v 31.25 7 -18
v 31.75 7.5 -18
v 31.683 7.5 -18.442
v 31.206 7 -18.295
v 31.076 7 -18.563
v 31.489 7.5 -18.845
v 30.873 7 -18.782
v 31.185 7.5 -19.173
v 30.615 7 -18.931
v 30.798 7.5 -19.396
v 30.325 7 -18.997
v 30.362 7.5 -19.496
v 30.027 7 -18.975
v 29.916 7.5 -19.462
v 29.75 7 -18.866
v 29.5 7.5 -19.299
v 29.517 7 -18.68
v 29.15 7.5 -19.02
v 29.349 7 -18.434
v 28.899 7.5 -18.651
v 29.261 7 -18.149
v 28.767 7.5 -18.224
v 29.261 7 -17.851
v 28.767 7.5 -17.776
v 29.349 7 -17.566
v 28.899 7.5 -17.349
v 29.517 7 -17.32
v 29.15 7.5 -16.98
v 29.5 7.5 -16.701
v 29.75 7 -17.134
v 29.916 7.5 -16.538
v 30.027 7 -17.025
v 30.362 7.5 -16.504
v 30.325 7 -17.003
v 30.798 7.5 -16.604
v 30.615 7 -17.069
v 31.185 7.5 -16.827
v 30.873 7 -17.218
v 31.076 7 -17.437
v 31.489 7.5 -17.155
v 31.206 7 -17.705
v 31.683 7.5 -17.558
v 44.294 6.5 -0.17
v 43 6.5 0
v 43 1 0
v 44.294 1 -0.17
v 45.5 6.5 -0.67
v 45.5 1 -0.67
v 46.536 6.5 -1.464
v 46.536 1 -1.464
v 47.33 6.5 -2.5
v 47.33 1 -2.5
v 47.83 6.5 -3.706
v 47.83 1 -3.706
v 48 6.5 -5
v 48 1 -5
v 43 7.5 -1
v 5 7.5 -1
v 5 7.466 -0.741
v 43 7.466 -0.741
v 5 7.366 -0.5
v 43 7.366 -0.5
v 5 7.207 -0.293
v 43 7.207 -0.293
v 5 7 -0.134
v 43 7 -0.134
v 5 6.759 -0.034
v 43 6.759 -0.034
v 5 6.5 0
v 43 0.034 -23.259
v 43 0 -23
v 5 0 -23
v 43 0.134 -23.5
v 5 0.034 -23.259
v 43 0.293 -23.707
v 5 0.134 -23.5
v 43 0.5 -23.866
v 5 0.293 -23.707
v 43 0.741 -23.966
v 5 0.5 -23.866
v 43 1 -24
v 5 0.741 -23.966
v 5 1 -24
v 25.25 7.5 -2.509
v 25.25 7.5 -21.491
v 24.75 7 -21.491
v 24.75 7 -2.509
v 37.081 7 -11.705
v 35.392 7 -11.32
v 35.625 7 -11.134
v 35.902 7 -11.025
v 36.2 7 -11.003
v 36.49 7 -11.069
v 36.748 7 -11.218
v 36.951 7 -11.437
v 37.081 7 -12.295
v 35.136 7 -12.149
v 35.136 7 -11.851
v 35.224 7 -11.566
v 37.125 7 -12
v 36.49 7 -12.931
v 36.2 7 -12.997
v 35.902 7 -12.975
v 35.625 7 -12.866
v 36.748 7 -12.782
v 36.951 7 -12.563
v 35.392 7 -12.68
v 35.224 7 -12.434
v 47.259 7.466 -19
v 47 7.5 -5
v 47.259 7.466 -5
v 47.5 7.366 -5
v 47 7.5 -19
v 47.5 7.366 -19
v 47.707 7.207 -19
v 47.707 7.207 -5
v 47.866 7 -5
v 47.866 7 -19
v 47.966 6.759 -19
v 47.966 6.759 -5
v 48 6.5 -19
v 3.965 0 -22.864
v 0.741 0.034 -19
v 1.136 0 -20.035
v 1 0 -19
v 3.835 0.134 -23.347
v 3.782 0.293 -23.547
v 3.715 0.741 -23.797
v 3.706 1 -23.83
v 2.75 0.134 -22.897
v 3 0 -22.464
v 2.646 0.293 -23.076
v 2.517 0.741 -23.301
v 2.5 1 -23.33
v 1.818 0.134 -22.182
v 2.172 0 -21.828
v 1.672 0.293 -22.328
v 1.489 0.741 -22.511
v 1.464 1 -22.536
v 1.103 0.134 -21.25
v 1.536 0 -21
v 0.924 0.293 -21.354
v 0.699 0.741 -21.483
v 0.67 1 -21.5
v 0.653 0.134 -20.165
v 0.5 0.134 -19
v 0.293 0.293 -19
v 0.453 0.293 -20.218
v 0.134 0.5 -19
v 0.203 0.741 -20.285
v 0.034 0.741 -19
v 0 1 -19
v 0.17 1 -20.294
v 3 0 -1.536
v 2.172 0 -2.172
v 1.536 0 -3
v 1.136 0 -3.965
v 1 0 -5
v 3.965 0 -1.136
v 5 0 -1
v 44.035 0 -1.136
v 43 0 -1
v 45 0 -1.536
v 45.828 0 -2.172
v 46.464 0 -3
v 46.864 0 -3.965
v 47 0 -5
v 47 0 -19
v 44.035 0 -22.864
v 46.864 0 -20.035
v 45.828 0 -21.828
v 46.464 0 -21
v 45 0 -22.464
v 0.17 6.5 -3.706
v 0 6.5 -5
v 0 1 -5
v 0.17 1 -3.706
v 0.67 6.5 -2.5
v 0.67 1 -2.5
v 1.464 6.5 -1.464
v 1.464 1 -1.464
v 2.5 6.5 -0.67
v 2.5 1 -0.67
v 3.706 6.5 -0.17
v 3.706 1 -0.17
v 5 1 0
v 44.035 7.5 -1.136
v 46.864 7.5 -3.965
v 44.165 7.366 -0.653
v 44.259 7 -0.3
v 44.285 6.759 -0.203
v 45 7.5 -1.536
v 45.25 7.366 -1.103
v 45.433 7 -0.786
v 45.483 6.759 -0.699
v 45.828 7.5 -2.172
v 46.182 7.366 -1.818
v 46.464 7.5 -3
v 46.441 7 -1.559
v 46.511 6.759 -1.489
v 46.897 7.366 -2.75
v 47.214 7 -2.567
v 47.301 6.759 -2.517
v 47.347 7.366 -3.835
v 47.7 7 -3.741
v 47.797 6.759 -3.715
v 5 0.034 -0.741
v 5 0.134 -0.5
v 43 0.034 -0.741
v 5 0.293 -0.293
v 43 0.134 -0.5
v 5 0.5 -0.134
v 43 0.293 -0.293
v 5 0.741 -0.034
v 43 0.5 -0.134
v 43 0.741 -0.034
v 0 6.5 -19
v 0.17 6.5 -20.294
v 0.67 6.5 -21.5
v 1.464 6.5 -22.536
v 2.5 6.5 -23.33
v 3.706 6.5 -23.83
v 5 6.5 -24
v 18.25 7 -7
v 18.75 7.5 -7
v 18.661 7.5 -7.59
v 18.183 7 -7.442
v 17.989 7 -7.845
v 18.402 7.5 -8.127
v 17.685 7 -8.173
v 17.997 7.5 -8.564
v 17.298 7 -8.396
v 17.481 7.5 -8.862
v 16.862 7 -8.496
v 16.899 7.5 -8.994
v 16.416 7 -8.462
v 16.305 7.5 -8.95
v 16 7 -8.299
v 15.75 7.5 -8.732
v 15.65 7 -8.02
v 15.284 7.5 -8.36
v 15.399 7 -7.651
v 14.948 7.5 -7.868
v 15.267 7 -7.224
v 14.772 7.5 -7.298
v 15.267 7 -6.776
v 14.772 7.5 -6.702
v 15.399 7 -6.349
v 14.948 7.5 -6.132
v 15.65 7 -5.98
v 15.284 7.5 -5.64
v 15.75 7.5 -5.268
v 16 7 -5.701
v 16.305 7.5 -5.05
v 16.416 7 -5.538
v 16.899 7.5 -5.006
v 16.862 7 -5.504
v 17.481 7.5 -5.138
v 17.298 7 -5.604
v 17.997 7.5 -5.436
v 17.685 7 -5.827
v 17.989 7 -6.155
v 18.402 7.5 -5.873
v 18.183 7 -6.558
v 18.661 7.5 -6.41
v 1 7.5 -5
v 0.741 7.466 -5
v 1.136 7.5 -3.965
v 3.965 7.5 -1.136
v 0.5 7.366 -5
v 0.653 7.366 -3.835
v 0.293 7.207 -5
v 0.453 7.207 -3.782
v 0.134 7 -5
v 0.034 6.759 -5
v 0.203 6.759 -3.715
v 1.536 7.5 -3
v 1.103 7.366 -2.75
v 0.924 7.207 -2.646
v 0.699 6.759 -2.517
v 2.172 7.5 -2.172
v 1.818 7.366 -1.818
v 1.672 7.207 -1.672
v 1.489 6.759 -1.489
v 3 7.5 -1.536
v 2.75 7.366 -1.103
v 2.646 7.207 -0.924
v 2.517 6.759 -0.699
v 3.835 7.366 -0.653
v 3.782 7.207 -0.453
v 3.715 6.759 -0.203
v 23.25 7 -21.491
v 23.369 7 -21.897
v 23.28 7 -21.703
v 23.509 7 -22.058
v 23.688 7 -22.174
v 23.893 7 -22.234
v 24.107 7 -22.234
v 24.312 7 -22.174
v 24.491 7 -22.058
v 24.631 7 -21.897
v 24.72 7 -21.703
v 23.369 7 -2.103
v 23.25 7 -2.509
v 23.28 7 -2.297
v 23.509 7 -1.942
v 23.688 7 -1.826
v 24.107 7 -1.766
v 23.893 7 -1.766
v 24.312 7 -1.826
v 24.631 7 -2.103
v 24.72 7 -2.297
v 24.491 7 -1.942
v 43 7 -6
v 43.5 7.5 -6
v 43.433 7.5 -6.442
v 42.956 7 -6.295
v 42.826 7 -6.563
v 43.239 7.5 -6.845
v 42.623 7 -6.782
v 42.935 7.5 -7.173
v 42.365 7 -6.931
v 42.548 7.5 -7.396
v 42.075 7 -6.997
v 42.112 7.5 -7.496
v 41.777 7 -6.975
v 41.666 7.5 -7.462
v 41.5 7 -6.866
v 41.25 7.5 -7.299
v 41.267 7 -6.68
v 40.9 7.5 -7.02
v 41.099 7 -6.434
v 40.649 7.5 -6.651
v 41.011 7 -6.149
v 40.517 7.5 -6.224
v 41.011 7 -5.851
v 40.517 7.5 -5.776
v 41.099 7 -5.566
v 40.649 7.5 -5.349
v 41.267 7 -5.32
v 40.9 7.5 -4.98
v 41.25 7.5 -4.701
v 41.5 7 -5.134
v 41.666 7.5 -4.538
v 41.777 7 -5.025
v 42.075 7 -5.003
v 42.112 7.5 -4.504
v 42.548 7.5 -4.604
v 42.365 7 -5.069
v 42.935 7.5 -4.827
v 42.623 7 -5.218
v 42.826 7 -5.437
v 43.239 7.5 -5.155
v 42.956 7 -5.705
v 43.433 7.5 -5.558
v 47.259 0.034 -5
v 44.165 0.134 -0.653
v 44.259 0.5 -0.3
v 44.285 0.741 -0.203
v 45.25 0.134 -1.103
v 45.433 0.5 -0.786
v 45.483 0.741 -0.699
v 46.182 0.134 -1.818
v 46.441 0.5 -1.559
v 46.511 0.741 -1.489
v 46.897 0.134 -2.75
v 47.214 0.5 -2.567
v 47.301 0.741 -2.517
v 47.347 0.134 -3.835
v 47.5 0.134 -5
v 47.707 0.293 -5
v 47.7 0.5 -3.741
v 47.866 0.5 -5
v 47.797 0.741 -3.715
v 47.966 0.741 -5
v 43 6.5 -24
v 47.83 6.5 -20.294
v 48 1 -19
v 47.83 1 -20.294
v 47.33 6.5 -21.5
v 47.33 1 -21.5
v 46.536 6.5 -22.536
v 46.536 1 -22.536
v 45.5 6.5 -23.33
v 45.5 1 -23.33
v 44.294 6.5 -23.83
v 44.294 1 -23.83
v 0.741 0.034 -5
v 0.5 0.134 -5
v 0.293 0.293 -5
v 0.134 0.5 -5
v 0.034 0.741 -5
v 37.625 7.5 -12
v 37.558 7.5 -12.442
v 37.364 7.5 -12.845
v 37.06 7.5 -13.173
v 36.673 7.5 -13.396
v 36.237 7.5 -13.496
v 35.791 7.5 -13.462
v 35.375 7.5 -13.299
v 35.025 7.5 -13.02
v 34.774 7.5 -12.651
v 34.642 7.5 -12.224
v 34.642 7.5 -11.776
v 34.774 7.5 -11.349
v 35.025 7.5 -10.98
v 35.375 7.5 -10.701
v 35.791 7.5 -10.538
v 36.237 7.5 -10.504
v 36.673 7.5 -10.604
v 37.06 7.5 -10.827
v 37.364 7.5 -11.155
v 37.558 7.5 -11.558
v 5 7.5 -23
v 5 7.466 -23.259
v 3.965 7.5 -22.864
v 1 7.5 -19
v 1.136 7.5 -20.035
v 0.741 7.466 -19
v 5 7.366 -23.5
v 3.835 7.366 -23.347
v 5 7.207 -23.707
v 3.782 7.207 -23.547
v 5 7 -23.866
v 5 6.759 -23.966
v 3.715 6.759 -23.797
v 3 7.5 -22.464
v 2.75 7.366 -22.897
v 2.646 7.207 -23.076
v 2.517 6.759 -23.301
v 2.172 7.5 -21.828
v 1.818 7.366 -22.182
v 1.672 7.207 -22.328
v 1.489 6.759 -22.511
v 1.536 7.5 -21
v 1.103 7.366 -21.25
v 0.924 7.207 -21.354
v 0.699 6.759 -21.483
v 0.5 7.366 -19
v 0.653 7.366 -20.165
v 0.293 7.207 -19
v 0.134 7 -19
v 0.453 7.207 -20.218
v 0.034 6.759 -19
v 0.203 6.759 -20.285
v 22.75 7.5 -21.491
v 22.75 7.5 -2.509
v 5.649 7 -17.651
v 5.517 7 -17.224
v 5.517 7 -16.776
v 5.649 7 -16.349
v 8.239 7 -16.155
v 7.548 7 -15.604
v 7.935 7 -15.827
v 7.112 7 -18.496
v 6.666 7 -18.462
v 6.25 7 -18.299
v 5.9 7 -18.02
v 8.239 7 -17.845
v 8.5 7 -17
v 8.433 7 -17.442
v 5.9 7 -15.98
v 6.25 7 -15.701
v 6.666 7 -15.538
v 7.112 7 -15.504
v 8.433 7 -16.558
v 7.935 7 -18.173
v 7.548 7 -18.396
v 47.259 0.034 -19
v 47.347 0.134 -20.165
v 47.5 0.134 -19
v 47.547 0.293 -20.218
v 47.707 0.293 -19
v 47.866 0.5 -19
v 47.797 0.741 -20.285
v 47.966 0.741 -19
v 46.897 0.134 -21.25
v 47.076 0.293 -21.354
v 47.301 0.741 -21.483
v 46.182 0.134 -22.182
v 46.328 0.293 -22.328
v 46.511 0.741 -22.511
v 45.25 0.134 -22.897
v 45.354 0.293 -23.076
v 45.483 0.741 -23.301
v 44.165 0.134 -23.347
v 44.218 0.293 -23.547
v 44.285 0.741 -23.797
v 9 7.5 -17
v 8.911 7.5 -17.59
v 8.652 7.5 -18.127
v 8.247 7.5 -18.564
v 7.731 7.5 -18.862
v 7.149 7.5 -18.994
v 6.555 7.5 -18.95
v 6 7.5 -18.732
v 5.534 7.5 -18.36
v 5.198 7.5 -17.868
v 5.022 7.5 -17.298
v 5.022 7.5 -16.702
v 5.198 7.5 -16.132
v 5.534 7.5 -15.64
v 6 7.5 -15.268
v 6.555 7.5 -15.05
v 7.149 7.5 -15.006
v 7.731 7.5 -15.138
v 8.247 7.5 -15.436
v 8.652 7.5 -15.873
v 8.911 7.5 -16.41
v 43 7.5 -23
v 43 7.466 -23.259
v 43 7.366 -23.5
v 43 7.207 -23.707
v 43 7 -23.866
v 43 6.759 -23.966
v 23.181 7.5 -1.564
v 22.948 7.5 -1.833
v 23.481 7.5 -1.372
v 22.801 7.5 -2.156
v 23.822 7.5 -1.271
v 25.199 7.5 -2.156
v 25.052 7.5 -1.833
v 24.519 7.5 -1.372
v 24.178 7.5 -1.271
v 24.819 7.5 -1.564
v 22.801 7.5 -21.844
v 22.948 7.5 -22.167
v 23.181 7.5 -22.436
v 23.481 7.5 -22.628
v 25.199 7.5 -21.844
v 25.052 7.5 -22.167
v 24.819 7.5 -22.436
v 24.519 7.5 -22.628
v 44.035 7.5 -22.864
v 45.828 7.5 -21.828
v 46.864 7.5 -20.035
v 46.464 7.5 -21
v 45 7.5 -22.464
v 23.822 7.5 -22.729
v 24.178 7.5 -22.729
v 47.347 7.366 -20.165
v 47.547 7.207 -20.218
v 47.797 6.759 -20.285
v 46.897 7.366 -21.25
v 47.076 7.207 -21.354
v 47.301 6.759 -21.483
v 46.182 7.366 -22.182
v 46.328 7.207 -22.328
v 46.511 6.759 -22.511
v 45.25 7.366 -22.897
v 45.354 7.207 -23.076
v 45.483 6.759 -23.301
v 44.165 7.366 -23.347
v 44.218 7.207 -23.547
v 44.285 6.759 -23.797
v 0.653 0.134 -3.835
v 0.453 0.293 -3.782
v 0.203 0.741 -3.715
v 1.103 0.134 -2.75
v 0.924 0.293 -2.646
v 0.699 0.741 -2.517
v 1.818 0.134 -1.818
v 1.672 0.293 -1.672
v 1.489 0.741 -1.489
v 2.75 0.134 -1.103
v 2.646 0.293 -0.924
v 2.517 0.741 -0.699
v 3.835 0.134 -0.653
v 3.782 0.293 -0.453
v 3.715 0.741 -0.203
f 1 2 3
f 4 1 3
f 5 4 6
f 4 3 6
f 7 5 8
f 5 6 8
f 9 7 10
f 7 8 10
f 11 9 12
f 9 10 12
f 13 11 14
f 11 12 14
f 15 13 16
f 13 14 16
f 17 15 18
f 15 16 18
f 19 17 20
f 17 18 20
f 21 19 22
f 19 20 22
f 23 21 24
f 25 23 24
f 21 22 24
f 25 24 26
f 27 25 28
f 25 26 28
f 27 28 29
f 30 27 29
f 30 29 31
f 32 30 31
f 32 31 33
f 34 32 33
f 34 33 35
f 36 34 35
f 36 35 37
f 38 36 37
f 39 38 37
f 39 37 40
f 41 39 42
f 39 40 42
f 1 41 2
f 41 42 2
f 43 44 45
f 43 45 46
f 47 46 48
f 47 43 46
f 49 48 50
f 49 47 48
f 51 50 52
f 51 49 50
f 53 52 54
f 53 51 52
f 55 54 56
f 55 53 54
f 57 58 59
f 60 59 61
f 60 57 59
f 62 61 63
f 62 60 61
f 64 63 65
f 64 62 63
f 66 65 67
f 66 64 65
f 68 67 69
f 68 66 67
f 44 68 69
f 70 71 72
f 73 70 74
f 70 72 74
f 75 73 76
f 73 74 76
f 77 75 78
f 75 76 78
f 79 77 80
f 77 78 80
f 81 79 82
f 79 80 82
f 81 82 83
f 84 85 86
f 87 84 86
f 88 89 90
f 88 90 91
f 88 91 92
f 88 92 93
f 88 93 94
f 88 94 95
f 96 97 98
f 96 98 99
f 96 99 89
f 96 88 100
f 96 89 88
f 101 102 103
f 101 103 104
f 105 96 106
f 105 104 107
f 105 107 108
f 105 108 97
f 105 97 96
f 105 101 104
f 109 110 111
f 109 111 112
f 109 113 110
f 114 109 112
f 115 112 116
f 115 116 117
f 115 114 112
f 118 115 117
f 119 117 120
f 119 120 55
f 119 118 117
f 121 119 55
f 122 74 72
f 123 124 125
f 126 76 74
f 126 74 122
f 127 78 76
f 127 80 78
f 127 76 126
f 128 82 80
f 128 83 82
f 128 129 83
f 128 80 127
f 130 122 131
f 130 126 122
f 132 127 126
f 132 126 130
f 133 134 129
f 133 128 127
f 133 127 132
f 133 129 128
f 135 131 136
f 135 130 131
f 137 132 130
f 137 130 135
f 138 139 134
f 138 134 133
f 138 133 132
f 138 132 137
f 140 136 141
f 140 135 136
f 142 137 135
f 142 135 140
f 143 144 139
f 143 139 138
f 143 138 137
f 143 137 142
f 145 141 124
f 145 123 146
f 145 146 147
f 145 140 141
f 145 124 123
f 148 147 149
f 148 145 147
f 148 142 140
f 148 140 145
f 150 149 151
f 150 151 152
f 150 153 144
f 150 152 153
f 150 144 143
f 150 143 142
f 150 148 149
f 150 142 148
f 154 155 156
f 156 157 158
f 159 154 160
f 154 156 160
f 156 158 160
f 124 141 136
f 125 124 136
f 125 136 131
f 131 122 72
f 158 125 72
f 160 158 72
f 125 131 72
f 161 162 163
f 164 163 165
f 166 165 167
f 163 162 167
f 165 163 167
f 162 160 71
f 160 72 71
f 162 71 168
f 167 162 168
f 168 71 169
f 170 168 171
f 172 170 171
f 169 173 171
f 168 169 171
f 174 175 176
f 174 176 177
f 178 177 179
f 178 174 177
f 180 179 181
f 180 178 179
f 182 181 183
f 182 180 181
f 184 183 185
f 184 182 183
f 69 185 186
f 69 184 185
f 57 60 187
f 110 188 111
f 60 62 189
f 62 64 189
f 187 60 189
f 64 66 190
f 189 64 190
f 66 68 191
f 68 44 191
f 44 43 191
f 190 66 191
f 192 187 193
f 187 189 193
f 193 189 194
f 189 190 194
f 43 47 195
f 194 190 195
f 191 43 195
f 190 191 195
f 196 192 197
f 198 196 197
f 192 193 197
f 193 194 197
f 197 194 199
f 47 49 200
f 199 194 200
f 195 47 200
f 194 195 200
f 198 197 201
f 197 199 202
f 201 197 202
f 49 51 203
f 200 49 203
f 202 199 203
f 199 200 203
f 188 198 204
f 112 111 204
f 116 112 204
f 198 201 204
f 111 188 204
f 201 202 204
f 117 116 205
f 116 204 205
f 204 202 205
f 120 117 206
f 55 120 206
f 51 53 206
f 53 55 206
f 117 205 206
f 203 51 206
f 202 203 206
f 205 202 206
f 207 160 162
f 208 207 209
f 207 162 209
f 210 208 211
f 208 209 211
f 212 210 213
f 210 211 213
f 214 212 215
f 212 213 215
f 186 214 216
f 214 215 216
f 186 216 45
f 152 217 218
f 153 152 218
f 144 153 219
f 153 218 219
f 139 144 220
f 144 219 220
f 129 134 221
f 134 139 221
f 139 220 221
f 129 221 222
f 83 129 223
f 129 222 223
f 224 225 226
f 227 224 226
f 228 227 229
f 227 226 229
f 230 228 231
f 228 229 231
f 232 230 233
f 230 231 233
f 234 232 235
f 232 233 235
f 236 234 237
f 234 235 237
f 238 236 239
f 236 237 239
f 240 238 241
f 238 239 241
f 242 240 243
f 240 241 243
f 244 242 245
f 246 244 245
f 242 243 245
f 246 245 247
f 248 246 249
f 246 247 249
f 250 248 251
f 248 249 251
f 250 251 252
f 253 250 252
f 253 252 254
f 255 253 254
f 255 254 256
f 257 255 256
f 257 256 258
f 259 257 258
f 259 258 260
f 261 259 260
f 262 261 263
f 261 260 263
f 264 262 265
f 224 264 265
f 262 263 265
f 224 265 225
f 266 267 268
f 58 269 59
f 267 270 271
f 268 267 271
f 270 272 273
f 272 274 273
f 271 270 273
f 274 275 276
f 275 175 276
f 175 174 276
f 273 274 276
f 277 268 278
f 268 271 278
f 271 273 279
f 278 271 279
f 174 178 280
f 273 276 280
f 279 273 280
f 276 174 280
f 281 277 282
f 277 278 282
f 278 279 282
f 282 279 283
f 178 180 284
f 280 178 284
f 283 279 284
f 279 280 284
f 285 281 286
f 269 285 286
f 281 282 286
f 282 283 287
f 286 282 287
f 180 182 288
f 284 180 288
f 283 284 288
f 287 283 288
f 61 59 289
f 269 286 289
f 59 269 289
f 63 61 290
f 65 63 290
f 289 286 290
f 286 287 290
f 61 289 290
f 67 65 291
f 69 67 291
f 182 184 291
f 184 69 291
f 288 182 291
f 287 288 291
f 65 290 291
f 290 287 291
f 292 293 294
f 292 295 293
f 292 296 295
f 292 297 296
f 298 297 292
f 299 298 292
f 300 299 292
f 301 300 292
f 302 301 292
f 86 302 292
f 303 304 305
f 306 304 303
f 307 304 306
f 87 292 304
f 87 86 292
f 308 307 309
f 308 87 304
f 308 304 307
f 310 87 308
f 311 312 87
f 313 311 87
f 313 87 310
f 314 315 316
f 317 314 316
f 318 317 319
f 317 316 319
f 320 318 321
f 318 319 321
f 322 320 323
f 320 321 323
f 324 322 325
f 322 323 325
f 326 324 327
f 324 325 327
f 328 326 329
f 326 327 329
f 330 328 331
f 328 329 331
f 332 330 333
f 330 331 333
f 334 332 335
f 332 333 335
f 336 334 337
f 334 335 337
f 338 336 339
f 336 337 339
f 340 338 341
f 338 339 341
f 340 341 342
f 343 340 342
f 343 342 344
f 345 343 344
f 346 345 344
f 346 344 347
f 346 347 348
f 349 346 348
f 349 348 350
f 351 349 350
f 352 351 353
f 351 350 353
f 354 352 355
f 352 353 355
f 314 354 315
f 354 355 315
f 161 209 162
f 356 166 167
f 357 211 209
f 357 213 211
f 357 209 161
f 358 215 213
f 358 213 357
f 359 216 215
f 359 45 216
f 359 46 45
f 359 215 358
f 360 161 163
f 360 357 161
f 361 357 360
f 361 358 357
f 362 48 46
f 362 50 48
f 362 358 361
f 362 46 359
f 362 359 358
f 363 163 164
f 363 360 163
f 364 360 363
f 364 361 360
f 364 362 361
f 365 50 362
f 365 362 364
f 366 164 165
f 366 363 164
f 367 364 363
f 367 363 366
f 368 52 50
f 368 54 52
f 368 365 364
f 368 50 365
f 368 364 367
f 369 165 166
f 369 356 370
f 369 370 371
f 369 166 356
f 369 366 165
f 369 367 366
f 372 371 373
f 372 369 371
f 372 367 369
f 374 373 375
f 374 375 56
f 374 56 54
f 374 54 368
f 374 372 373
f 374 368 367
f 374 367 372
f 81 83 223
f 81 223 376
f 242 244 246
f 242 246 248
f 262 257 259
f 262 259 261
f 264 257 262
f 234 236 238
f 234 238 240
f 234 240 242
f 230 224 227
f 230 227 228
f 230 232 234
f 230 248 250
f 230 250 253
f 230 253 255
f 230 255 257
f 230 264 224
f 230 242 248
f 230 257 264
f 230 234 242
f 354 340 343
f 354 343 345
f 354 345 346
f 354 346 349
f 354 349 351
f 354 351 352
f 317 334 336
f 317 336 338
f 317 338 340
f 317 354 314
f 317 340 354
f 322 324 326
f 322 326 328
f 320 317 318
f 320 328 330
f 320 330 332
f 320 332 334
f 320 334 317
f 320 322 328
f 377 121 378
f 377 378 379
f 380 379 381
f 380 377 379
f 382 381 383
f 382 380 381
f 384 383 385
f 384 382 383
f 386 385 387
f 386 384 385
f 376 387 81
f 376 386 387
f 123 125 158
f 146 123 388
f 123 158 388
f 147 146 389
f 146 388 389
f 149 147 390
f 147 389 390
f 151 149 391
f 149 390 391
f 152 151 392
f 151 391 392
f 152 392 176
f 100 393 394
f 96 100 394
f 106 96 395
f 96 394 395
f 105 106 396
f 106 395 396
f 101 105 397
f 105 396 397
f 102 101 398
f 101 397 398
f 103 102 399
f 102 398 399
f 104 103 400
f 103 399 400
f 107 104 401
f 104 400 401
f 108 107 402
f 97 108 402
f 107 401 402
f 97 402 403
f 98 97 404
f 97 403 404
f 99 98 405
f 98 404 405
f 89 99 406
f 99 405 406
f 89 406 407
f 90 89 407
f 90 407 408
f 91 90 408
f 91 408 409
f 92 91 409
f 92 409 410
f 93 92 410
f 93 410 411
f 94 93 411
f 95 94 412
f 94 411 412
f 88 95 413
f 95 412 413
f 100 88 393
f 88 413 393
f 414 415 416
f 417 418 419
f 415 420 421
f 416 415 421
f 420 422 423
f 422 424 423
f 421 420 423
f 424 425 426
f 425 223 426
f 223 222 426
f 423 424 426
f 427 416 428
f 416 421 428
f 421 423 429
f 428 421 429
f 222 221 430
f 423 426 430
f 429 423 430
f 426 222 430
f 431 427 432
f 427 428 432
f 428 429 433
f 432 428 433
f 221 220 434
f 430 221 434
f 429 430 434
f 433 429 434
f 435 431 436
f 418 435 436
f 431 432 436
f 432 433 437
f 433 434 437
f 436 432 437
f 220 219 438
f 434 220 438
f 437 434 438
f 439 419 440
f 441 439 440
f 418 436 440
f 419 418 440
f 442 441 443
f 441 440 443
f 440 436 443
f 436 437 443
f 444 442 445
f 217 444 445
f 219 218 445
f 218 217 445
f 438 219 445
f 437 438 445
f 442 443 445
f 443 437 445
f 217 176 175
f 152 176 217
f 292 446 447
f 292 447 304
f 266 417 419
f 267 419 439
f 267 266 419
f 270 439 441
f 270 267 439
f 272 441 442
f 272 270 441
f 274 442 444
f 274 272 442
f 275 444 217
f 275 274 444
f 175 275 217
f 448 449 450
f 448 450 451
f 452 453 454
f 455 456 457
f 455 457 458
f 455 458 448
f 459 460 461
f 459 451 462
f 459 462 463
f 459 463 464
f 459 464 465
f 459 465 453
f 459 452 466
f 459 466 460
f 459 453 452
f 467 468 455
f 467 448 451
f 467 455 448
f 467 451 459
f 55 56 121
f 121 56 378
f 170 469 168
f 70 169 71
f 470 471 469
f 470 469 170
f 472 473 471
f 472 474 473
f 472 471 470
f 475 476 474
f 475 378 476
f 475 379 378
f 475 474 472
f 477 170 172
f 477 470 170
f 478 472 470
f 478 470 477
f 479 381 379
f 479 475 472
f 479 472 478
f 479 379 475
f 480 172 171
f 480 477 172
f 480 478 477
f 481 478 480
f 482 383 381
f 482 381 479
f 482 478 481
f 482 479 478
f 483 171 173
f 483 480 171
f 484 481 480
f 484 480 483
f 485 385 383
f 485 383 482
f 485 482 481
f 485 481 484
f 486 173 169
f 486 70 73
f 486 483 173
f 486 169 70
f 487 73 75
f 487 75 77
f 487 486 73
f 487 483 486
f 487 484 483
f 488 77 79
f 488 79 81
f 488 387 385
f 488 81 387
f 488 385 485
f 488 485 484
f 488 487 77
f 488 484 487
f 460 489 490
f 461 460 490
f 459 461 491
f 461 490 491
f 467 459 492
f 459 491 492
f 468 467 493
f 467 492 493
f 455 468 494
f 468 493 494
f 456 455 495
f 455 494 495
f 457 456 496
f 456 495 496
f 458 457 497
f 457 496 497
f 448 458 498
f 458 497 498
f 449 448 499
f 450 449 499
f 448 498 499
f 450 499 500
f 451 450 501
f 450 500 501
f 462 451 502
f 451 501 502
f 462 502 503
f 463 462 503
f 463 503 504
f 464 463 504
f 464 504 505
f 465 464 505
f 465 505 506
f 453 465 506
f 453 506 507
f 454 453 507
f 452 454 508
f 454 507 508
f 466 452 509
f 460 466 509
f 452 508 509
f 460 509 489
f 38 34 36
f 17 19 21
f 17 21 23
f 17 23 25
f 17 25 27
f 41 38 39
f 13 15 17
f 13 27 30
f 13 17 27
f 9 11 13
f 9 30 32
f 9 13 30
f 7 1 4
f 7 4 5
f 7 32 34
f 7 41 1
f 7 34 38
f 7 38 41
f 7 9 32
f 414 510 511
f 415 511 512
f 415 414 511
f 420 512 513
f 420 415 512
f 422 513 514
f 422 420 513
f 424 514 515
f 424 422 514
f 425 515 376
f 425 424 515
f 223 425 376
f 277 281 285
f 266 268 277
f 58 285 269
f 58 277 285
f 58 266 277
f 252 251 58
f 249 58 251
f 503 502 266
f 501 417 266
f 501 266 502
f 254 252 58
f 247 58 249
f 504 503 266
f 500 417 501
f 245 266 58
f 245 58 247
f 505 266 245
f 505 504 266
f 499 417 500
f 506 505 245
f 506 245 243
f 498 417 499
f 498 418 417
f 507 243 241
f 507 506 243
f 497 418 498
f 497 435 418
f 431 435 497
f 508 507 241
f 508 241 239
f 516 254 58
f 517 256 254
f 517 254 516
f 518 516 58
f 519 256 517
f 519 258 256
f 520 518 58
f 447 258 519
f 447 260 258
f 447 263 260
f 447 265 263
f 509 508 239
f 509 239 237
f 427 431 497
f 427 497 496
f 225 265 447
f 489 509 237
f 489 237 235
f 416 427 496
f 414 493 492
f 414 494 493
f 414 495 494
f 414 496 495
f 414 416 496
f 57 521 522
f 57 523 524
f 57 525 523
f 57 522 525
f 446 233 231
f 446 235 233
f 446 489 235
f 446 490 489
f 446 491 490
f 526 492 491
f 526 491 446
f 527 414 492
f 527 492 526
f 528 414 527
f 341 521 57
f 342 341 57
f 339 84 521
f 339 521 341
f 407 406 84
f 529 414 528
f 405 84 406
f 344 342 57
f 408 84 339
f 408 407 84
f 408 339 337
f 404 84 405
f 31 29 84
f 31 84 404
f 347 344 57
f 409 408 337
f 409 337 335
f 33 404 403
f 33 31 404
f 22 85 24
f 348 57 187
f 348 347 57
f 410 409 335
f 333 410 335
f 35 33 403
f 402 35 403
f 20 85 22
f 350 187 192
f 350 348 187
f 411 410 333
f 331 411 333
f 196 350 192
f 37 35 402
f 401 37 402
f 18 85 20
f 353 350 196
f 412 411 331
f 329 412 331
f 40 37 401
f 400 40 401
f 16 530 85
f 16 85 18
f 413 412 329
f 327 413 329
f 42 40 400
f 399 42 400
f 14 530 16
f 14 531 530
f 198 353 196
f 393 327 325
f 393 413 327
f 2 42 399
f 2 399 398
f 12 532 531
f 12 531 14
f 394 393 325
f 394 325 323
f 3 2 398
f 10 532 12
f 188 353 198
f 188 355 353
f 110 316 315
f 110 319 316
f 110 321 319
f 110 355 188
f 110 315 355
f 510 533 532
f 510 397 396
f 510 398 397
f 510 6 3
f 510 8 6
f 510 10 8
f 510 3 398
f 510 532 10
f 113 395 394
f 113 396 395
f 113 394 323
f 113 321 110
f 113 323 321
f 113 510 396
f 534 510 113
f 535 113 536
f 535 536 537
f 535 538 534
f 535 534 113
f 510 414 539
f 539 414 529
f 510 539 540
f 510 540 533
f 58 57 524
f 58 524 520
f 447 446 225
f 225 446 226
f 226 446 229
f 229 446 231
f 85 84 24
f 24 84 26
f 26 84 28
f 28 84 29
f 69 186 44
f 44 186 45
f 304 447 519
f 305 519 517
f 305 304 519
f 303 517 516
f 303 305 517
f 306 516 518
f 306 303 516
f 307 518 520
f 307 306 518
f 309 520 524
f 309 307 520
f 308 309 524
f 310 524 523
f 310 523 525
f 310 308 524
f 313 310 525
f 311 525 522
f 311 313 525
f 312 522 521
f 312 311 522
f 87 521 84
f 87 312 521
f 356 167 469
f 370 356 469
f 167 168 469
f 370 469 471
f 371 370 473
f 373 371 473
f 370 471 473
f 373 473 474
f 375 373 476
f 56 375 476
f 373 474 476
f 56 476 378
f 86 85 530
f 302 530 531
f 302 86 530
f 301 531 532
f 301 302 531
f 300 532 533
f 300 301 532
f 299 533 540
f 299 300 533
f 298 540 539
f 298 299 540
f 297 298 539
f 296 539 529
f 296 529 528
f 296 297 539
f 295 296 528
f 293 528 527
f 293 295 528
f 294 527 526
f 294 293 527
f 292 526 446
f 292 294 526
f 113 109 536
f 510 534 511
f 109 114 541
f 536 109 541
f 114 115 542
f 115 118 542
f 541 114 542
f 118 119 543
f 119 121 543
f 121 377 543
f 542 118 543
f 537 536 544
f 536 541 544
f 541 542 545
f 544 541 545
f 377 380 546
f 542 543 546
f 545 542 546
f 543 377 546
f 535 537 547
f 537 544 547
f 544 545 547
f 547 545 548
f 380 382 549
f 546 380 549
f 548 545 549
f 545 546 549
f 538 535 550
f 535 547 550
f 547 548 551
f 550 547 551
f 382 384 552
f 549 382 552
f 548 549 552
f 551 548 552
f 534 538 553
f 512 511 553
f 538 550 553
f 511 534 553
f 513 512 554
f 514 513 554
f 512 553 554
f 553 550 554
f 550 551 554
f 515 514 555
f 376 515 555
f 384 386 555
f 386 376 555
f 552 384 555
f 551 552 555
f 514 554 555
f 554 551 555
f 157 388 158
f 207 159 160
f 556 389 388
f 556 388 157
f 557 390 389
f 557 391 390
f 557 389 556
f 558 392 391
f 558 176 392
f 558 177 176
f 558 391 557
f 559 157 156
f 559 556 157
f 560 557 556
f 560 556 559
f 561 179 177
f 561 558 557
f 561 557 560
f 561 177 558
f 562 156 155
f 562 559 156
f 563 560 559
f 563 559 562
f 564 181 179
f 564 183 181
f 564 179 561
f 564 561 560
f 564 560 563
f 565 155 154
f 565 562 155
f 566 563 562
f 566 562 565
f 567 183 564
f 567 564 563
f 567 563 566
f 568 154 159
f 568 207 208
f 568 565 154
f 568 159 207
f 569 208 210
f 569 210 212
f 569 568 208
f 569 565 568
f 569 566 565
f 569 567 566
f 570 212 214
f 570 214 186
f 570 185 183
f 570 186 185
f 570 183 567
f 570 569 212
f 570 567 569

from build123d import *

# Parameters (mm, degrees)
ESQUISSE1_W                = 48
ESQUISSE1_H                = 24
EXTRUSION1_DEPTH           = 7.5
CONG_2_R                   = 5
CONG_5_R                   = 1
CONG_6_R                   = 1
ESQUISSE4_W                = 0.5
ESQUISSE4_H                = 18.982849842
EXTRUSION2_DEPTH           = 0.5
ESQUISSE5_R                = 0.25
EXTRUSION3_DEPTH           = 0.5
CHANFREIN1_SIZE            = 1
ESQUISSE9_R                = 1.5
EXTRUSION6_DEPTH           = 0.5
EXTRUSION6_DRAFT           = -45
EXTRUSION6_PROFILE_2_DEPTH = 0.5
EXTRUSION6_PROFILE_2_DRAFT = -45
EXTRUSION6_PROFILE_3_DEPTH = 0.5
EXTRUSION6_PROFILE_3_DRAFT = -45
ESQUISSE10_R               = 2
EXTRUSION7_DEPTH           = 0.5
EXTRUSION7_DRAFT           = -45
EXTRUSION7_PROFILE_2_DEPTH = 0.5
EXTRUSION7_PROFILE_2_DRAFT = -45


with BuildPart() as part:
    # Esquisse1 → Extrusion1 (new body)
    with BuildSketch(Plane(origin=(0, 0, 0), x_dir=(1, 0, 0), z_dir=(0, 1, 0))):
        with Locations((24, 12)):
            Rectangle(ESQUISSE1_W, ESQUISSE1_H)
    extrude(amount=EXTRUSION1_DEPTH)

    # Congé2
    cong_2_edges = [part.edges().sort_by_distance(p)[0] for p in [
        (0, 3.75, -24),
        (48, 3.75, -24),
        (48, 3.75, 0),
        (0, 3.75, 0),
    ]]
    fillet(cong_2_edges, radius=CONG_2_R)

    # Congé5
    cong_5_edges = [part.edges().sort_by_distance(p)[0] for p in [
        (48, 7.5, -12),
        (24, 7.5, 0),
        (0, 7.5, -12),
        (24, 7.5, -24),
        (1.464466094, 7.5, -22.535533906),
        (1.464466094, 7.5, -1.464466094),
        (46.535533906, 7.5, -22.535533906),
        (46.535533906, 7.5, -1.464466094),
    ]]
    fillet(cong_5_edges, radius=CONG_5_R)

    # Congé6
    cong_6_edges = [part.edges().sort_by_distance(p)[0] for p in [
        (48, 0, -12),
        (0, 0, -12),
        (24, 0, -24),
        (24, 0, 0),
        (1.464466094, 0, -22.535533906),
        (1.464466094, 0, -1.464466094),
        (46.535533906, 0, -22.535533906),
        (46.535533906, 0, -1.464466094),
    ]]
    fillet(cong_6_edges, radius=CONG_6_R)

    # Esquisse4 → Extrusion2 (cut)
    with BuildSketch(Plane(origin=(0, 7.5, 0), x_dir=(1, 0, 0), z_dir=(0, 1, 0))):
        with Locations((24, 12)):
            Rectangle(ESQUISSE4_W, ESQUISSE4_H)
    extrude(amount=-EXTRUSION2_DEPTH, mode=Mode.SUBTRACT)

    # Esquisse5 → Extrusion3 (cut)
    with BuildSketch(Plane(origin=(0, 7.5, 0), x_dir=(1, 0, 0), z_dir=(0, 1, 0))):
        with Locations((24, 21.491424921)):
            Circle(ESQUISSE5_R)
        with Locations((24, 2.508575079)):
            Circle(ESQUISSE5_R)
    extrude(amount=-EXTRUSION3_DEPTH, mode=Mode.SUBTRACT)

    # Chanfrein1
    # the kernel refuses this chamfer: 1 mm, written as the material it takes off along each edge
    with BuildSketch(Plane(origin=(24, 7.5, -21.491424921), x_dir=(1, 0, 0), z_dir=(0, 0, 1))) as chanfrein1_piece_1_section:
        Polygon((0.25 + CHANFREIN1_SIZE, 0), (0.25, -CHANFREIN1_SIZE), (0.25, 0), align=None)
    chanfrein1_piece_1 = revolve(axis=Axis((24, 7.5, -21.491424921), (0, 1, 0)), revolution_arc=180, mode=Mode.PRIVATE)
    chanfrein1_piece_1 = split(chanfrein1_piece_1, bisect_by=Plane(origin=(24, 7, -21.964580549), z_dir=(0, 1, 0)), keep=Keep.TOP, mode=Mode.PRIVATE)
    add(chanfrein1_piece_1, mode=Mode.SUBTRACT)
    with BuildSketch(Plane(origin=(24.25, 7.5, -21.491424921), x_dir=(0.9996219169112968, 0.02749587661058651, 0), z_dir=(0, 0, 1))) as chanfrein1_piece_2_section:
        Polygon((CHANFREIN1_SIZE * 0.999621916911, -CHANFREIN1_SIZE * 0.0274958766106), (-CHANFREIN1_SIZE * 0.0274958766106, -CHANFREIN1_SIZE * 0.999621916911), (0, 0), align=None)
    chanfrein1_piece_2 = extrude(amount=18.982849842, mode=Mode.PRIVATE)
    chanfrein1_piece_2 = split(chanfrein1_piece_2, bisect_by=Plane(origin=(24.643401084, 7, -12), z_dir=(0, 1, 0)), keep=Keep.TOP, mode=Mode.PRIVATE)
    add(chanfrein1_piece_2, mode=Mode.SUBTRACT)
    with BuildSketch(Plane(origin=(24, 7.5, -2.508575079), x_dir=(-1, 0, 0), z_dir=(0, 0, -1))) as chanfrein1_piece_3_section:
        Polygon((0.25 + CHANFREIN1_SIZE, 0), (0.25, -CHANFREIN1_SIZE), (0.25, 0), align=None)
    chanfrein1_piece_3 = revolve(axis=Axis((24, 7.5, -2.508575079), (0, 1, 0)), revolution_arc=180, mode=Mode.PRIVATE)
    chanfrein1_piece_3 = split(chanfrein1_piece_3, bisect_by=Plane(origin=(24, 7, -2.035419451), z_dir=(0, 1, 0)), keep=Keep.TOP, mode=Mode.PRIVATE)
    add(chanfrein1_piece_3, mode=Mode.SUBTRACT)
    with BuildSketch(Plane(origin=(23.75, 7.5, -2.508575079), x_dir=(-0.9996219169112968, 0.02749587661058651, 0), z_dir=(0, 0, -1))) as chanfrein1_piece_4_section:
        Polygon((CHANFREIN1_SIZE * 0.999621916911, -CHANFREIN1_SIZE * 0.0274958766106), (-CHANFREIN1_SIZE * 0.0274958766106, -CHANFREIN1_SIZE * 0.999621916911), (0, 0), align=None)
    chanfrein1_piece_4 = extrude(amount=18.982849842, mode=Mode.PRIVATE)
    chanfrein1_piece_4 = split(chanfrein1_piece_4, bisect_by=Plane(origin=(23.356598916, 7, -12), z_dir=(0, 1, 0)), keep=Keep.TOP, mode=Mode.PRIVATE)
    add(chanfrein1_piece_4, mode=Mode.SUBTRACT)


with BuildPart() as extrusion6_tool:
    # Esquisse9 → Extrusion6 (with draft: the straight prism first)
    with BuildSketch(Plane(origin=(0, 7.5, 0), x_dir=(1, 0, 0), z_dir=(0, 1, 0))):
        with Locations((30.25, 18)):
            Circle(ESQUISSE9_R)
    extrude(amount=-EXTRUSION6_DEPTH)
    # Extrusion6: the draft: its side faces are tilted about the plane it starts from
    extrusion6_sides = [extrusion6_tool.faces().sort_by_distance(p)[0] for p in [
        (28.75, 7.25, -18),
    ]]
    draft(extrusion6_sides, Plane(origin=(0, 7.5, 0), x_dir=(1, 0, 0), z_dir=(0, 1, 0)), EXTRUSION6_DRAFT)


with BuildPart() as part_1:
    add(part.part)

    # Extrusion6: cut by extrusion6_tool
    add(extrusion6_tool.part, mode=Mode.SUBTRACT)


with BuildPart() as extrusion6_profile_2_tool:
    # Esquisse9 → Extrusion6 profile 2 (with draft: the straight prism first)
    with BuildSketch(Plane(origin=(0, 7.5, 0), x_dir=(1, 0, 0), z_dir=(0, 1, 0))):
        with Locations((36.125, 12)):
            Circle(ESQUISSE9_R)
    extrude(amount=-EXTRUSION6_PROFILE_2_DEPTH)
    # Extrusion6 profile 2: the draft: its side faces are tilted about the plane it starts from
    extrusion6_profile_2_sides = [extrusion6_profile_2_tool.faces().sort_by_distance(p)[0] for p in [
        (34.625, 7.25, -12),
    ]]
    draft(extrusion6_profile_2_sides, Plane(origin=(0, 7.5, 0), x_dir=(1, 0, 0), z_dir=(0, 1, 0)), EXTRUSION6_PROFILE_2_DRAFT)


with BuildPart() as part_2:
    add(part_1.part)

    # Extrusion6 profile 2: cut by extrusion6_profile_2_tool
    add(extrusion6_profile_2_tool.part, mode=Mode.SUBTRACT)


with BuildPart() as extrusion6_profile_3_tool:
    # Esquisse9 → Extrusion6 profile 3 (with draft: the straight prism first)
    with BuildSketch(Plane(origin=(0, 7.5, 0), x_dir=(1, 0, 0), z_dir=(0, 1, 0))):
        with Locations((42, 6)):
            Circle(ESQUISSE9_R)
    extrude(amount=-EXTRUSION6_PROFILE_3_DEPTH)
    # Extrusion6 profile 3: the draft: its side faces are tilted about the plane it starts from
    extrusion6_profile_3_sides = [extrusion6_profile_3_tool.faces().sort_by_distance(p)[0] for p in [
        (40.5, 7.25, -6),
    ]]
    draft(extrusion6_profile_3_sides, Plane(origin=(0, 7.5, 0), x_dir=(1, 0, 0), z_dir=(0, 1, 0)), EXTRUSION6_PROFILE_3_DRAFT)


with BuildPart() as part_3:
    add(part_2.part)

    # Extrusion6 profile 3: cut by extrusion6_profile_3_tool
    add(extrusion6_profile_3_tool.part, mode=Mode.SUBTRACT)


with BuildPart() as extrusion7_tool:
    # Esquisse10 → Extrusion7 (with draft: the straight prism first)
    with BuildSketch(Plane(origin=(0, 7.5, 0), x_dir=(1, 0, 0), z_dir=(0, 1, 0))):
        with Locations((7, 17)):
            Circle(ESQUISSE10_R)
    extrude(amount=-EXTRUSION7_DEPTH)
    # Extrusion7: the draft: its side faces are tilted about the plane it starts from
    extrusion7_sides = [extrusion7_tool.faces().sort_by_distance(p)[0] for p in [
        (5, 7.25, -17),
    ]]
    draft(extrusion7_sides, Plane(origin=(0, 7.5, 0), x_dir=(1, 0, 0), z_dir=(0, 1, 0)), EXTRUSION7_DRAFT)


with BuildPart() as part_4:
    add(part_3.part)

    # Extrusion7: cut by extrusion7_tool
    add(extrusion7_tool.part, mode=Mode.SUBTRACT)


with BuildPart() as extrusion7_profile_2_tool:
    # Esquisse10 → Extrusion7 profile 2 (with draft: the straight prism first)
    with BuildSketch(Plane(origin=(0, 7.5, 0), x_dir=(1, 0, 0), z_dir=(0, 1, 0))):
        with Locations((16.75, 7)):
            Circle(ESQUISSE10_R)
    extrude(amount=-EXTRUSION7_PROFILE_2_DEPTH)
    # Extrusion7 profile 2: the draft: its side faces are tilted about the plane it starts from
    extrusion7_profile_2_sides = [extrusion7_profile_2_tool.faces().sort_by_distance(p)[0] for p in [
        (14.75, 7.25, -7),
    ]]
    draft(extrusion7_profile_2_sides, Plane(origin=(0, 7.5, 0), x_dir=(1, 0, 0), z_dir=(0, 1, 0)), EXTRUSION7_PROFILE_2_DRAFT)


with BuildPart() as part_5:
    add(part_4.part)

    # Extrusion7 profile 2: cut by extrusion7_profile_2_tool
    add(extrusion7_profile_2_tool.part, mode=Mode.SUBTRACT)


solid = part_5.part
